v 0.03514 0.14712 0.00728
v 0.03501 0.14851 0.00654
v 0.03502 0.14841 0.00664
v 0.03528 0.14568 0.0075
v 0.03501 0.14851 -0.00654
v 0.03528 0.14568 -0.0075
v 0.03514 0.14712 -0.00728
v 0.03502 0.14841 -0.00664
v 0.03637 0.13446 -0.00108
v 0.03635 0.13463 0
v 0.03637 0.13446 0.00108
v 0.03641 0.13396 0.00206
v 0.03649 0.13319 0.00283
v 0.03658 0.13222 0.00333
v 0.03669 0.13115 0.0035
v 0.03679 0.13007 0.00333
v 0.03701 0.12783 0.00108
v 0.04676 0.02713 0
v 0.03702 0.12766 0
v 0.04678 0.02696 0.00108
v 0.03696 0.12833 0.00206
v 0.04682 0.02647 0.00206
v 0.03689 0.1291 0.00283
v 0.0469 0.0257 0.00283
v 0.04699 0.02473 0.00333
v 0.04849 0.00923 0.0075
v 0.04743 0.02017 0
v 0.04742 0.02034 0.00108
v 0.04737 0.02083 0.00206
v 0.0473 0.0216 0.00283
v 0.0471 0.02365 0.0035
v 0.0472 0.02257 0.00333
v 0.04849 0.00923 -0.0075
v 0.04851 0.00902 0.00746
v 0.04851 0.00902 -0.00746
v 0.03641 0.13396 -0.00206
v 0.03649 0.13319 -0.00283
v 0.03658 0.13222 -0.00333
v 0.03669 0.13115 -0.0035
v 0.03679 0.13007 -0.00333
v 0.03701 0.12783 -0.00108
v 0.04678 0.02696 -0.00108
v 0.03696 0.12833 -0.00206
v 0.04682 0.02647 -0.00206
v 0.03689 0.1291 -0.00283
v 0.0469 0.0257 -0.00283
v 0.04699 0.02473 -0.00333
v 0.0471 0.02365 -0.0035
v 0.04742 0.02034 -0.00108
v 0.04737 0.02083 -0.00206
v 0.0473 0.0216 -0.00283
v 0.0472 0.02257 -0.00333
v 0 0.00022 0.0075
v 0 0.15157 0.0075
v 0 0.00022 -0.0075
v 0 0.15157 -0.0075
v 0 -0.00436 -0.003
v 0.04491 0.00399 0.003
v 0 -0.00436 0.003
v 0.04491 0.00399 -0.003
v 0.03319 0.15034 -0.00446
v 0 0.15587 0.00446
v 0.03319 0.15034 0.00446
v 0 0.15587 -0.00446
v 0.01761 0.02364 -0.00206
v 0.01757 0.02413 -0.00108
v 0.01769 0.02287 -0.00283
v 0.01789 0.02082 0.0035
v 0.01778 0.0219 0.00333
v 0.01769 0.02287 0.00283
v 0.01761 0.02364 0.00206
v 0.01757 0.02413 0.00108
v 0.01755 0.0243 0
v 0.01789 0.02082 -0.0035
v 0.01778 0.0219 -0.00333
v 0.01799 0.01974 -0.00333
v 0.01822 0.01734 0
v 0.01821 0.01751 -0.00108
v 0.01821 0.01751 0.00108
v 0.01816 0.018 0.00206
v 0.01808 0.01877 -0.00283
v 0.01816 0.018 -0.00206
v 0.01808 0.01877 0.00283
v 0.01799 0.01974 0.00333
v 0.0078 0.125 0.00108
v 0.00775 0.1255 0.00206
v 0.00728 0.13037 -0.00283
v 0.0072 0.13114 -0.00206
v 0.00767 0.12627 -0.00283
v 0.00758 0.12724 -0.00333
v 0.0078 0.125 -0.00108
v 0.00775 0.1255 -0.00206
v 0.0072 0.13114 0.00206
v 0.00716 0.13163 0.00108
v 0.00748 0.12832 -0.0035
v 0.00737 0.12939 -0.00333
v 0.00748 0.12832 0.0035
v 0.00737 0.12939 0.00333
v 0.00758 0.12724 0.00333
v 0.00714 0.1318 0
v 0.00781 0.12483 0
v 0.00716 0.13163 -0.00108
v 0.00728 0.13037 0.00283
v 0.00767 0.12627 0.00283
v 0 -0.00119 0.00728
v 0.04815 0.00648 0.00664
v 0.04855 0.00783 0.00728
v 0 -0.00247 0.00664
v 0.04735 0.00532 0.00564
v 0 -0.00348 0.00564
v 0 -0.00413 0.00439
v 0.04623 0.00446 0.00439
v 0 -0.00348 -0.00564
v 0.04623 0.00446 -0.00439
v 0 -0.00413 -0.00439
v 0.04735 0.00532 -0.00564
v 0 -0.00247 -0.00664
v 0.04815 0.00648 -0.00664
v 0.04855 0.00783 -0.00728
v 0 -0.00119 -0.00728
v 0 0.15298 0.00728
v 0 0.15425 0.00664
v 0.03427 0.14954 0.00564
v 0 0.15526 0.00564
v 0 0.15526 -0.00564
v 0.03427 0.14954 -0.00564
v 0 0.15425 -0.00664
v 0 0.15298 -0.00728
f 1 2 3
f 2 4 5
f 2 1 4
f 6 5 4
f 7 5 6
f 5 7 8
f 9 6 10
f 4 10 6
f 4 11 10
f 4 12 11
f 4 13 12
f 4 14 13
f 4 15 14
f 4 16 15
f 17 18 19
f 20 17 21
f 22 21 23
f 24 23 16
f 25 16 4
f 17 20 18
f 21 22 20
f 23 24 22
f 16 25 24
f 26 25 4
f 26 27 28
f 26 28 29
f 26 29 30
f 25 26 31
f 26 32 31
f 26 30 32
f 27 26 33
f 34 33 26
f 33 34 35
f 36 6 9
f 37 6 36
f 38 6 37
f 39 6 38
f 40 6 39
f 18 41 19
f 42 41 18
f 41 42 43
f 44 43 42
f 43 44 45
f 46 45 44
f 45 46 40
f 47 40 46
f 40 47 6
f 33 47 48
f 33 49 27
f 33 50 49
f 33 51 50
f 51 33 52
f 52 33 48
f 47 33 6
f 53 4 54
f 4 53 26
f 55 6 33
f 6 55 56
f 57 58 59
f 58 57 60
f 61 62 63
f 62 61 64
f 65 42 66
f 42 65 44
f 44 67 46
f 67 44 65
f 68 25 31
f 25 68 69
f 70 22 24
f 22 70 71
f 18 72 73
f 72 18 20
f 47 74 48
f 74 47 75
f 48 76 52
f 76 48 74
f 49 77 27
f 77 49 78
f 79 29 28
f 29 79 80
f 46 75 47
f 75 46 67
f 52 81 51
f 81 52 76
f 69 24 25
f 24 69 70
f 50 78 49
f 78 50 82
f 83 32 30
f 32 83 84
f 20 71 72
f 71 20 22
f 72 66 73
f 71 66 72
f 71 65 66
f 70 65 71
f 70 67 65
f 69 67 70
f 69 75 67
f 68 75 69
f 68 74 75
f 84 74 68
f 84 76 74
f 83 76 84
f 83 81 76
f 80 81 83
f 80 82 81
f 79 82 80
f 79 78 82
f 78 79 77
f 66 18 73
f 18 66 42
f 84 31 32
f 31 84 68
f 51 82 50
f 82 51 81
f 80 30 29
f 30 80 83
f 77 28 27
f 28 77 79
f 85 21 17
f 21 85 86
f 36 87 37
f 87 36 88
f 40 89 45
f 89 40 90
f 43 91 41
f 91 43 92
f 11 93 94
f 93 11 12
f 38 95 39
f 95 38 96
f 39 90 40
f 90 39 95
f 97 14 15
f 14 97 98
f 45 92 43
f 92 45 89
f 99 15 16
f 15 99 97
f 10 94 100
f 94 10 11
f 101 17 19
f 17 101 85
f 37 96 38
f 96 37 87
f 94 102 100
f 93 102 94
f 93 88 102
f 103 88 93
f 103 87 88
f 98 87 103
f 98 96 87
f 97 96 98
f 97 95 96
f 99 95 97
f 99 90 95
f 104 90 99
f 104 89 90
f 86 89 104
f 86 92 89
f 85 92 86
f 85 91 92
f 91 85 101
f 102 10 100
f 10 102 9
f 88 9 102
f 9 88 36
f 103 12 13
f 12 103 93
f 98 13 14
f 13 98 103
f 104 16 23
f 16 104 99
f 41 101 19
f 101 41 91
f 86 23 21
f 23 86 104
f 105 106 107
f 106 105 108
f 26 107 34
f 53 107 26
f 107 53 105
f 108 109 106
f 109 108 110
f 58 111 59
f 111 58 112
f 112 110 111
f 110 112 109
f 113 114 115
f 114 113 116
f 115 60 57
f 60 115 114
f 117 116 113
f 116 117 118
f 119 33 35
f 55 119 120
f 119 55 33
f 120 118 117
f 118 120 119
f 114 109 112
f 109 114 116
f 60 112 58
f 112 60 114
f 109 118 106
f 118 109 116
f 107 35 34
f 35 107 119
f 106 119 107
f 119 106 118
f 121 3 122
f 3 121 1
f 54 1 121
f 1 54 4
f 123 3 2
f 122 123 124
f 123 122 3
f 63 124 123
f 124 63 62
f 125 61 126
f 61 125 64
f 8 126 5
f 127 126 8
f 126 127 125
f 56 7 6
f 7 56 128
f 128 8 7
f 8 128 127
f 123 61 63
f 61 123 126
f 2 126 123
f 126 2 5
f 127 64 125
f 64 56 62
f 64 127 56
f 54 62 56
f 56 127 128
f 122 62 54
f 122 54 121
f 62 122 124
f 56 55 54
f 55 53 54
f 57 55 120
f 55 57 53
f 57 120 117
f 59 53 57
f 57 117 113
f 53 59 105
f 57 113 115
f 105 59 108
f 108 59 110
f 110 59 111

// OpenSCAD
// Dimensions in m (SI)
top_length   = 0.146;
bot_length   = 0.156;
front_height = 0.05;
back_height  = 0.036;
thick        = 0.015;

front_angle = 95;
back_angle  = 105;

round_radius = 0.0045;

drill_depth = 0.03;
drill_dia   = 0.007;
drill_dist  = 0.019;

// face resolution for curved surfaces
$fn=20;

// instantiate
tuttle();

module tuttle()
{
    difference()
    {
        base_shape();
        base_cut();
        front_cut();
        back_cut();
    }
}

module base_shape()
{
    rotate([0,0,rot_angle()])
    translate([0,0,-thick/2])
    difference() {
    union()
    {
        cube(size=[height(),
                   top_length,
                   thick],
             center=false);

        translate([height(),0,0])
        rotate([0,0,front_angle])
        cube(size=[0.02,
                   front_height,
                   thick],
             center=false);

        translate([height(),
                   top_length,
                   0])
        mirror([0,1,0])
        rotate([0,0,back_angle])
        cube(size=[0.02,
                   front_height,
                   thick],
             center=false);
    }
        drill_holes();
    }
}

module drill_holes()
{
    union()
    {
        drill_hole(drill_dist);
        drill_hole(top_length-drill_dist);
    }
}

module drill_hole(FrontDistance)
{
    translate([vert_front_h()-drill_depth,
               FrontDistance,
               thick/2])
    rotate([0,90,0])
    cylinder(h=drill_depth*1.1,
             d=drill_dia,
             center = false);
}

module base_cut()
{
    translate([-0.02,
               -back_height,
               -thick*1.1/2])
    cube(size=[0.02,
               back_height*6,
               thick*1.1],
         center=false);
}

module back_cut()
{
    rotate([0,0,rot_angle()])
    translate([0,0,-thick/2])

    translate([height()*1.02,
               top_length,
               0])
    mirror([0,1,0])
    rotate([0,0,back_angle])
    rounding_cuts();
}

module front_cut()
{
    rotate([0,0,rot_angle()])
    translate([0,0,-thick/2])

    translate([height(),0,0])
    rotate([0,0,front_angle])
    rounding_cuts();
}

module rounding_cuts()
{
    union()
    {
        translate([round_radius,
                   front_height*1.05,
                   thick-round_radius])
        rotate([90,-90,0])
        round_cut(front_height);

        translate([round_radius,
                   front_height*1.05,
                   round_radius])
        rotate([90,180,0])
        round_cut(front_height);

        translate([round_radius,
                   round_radius/1.1,
                   0])
        rotate([0,0,180])
        round_cut(thick);
    }
}

module round_cut(Height)
{
    difference()
    {
        cube(size=[round_radius*1.1,
                   round_radius*1.1,
                   Height*1.1],
             center=false);
        cylinder(h=Height*1.1,
                 r=round_radius,
                 center=false);
    }
}


function rot_angle() =
    asin(vert_back_dist()/bot_length);
function vert_front_h() = front_height * cos(front_angle-90);
function vert_back_dist() = vert_front_h() - back_height * sin(180-back_angle);

function height() = front_height * cos(front_angle-(height_angle()));
function height_angle() = 90-rot_angle();
